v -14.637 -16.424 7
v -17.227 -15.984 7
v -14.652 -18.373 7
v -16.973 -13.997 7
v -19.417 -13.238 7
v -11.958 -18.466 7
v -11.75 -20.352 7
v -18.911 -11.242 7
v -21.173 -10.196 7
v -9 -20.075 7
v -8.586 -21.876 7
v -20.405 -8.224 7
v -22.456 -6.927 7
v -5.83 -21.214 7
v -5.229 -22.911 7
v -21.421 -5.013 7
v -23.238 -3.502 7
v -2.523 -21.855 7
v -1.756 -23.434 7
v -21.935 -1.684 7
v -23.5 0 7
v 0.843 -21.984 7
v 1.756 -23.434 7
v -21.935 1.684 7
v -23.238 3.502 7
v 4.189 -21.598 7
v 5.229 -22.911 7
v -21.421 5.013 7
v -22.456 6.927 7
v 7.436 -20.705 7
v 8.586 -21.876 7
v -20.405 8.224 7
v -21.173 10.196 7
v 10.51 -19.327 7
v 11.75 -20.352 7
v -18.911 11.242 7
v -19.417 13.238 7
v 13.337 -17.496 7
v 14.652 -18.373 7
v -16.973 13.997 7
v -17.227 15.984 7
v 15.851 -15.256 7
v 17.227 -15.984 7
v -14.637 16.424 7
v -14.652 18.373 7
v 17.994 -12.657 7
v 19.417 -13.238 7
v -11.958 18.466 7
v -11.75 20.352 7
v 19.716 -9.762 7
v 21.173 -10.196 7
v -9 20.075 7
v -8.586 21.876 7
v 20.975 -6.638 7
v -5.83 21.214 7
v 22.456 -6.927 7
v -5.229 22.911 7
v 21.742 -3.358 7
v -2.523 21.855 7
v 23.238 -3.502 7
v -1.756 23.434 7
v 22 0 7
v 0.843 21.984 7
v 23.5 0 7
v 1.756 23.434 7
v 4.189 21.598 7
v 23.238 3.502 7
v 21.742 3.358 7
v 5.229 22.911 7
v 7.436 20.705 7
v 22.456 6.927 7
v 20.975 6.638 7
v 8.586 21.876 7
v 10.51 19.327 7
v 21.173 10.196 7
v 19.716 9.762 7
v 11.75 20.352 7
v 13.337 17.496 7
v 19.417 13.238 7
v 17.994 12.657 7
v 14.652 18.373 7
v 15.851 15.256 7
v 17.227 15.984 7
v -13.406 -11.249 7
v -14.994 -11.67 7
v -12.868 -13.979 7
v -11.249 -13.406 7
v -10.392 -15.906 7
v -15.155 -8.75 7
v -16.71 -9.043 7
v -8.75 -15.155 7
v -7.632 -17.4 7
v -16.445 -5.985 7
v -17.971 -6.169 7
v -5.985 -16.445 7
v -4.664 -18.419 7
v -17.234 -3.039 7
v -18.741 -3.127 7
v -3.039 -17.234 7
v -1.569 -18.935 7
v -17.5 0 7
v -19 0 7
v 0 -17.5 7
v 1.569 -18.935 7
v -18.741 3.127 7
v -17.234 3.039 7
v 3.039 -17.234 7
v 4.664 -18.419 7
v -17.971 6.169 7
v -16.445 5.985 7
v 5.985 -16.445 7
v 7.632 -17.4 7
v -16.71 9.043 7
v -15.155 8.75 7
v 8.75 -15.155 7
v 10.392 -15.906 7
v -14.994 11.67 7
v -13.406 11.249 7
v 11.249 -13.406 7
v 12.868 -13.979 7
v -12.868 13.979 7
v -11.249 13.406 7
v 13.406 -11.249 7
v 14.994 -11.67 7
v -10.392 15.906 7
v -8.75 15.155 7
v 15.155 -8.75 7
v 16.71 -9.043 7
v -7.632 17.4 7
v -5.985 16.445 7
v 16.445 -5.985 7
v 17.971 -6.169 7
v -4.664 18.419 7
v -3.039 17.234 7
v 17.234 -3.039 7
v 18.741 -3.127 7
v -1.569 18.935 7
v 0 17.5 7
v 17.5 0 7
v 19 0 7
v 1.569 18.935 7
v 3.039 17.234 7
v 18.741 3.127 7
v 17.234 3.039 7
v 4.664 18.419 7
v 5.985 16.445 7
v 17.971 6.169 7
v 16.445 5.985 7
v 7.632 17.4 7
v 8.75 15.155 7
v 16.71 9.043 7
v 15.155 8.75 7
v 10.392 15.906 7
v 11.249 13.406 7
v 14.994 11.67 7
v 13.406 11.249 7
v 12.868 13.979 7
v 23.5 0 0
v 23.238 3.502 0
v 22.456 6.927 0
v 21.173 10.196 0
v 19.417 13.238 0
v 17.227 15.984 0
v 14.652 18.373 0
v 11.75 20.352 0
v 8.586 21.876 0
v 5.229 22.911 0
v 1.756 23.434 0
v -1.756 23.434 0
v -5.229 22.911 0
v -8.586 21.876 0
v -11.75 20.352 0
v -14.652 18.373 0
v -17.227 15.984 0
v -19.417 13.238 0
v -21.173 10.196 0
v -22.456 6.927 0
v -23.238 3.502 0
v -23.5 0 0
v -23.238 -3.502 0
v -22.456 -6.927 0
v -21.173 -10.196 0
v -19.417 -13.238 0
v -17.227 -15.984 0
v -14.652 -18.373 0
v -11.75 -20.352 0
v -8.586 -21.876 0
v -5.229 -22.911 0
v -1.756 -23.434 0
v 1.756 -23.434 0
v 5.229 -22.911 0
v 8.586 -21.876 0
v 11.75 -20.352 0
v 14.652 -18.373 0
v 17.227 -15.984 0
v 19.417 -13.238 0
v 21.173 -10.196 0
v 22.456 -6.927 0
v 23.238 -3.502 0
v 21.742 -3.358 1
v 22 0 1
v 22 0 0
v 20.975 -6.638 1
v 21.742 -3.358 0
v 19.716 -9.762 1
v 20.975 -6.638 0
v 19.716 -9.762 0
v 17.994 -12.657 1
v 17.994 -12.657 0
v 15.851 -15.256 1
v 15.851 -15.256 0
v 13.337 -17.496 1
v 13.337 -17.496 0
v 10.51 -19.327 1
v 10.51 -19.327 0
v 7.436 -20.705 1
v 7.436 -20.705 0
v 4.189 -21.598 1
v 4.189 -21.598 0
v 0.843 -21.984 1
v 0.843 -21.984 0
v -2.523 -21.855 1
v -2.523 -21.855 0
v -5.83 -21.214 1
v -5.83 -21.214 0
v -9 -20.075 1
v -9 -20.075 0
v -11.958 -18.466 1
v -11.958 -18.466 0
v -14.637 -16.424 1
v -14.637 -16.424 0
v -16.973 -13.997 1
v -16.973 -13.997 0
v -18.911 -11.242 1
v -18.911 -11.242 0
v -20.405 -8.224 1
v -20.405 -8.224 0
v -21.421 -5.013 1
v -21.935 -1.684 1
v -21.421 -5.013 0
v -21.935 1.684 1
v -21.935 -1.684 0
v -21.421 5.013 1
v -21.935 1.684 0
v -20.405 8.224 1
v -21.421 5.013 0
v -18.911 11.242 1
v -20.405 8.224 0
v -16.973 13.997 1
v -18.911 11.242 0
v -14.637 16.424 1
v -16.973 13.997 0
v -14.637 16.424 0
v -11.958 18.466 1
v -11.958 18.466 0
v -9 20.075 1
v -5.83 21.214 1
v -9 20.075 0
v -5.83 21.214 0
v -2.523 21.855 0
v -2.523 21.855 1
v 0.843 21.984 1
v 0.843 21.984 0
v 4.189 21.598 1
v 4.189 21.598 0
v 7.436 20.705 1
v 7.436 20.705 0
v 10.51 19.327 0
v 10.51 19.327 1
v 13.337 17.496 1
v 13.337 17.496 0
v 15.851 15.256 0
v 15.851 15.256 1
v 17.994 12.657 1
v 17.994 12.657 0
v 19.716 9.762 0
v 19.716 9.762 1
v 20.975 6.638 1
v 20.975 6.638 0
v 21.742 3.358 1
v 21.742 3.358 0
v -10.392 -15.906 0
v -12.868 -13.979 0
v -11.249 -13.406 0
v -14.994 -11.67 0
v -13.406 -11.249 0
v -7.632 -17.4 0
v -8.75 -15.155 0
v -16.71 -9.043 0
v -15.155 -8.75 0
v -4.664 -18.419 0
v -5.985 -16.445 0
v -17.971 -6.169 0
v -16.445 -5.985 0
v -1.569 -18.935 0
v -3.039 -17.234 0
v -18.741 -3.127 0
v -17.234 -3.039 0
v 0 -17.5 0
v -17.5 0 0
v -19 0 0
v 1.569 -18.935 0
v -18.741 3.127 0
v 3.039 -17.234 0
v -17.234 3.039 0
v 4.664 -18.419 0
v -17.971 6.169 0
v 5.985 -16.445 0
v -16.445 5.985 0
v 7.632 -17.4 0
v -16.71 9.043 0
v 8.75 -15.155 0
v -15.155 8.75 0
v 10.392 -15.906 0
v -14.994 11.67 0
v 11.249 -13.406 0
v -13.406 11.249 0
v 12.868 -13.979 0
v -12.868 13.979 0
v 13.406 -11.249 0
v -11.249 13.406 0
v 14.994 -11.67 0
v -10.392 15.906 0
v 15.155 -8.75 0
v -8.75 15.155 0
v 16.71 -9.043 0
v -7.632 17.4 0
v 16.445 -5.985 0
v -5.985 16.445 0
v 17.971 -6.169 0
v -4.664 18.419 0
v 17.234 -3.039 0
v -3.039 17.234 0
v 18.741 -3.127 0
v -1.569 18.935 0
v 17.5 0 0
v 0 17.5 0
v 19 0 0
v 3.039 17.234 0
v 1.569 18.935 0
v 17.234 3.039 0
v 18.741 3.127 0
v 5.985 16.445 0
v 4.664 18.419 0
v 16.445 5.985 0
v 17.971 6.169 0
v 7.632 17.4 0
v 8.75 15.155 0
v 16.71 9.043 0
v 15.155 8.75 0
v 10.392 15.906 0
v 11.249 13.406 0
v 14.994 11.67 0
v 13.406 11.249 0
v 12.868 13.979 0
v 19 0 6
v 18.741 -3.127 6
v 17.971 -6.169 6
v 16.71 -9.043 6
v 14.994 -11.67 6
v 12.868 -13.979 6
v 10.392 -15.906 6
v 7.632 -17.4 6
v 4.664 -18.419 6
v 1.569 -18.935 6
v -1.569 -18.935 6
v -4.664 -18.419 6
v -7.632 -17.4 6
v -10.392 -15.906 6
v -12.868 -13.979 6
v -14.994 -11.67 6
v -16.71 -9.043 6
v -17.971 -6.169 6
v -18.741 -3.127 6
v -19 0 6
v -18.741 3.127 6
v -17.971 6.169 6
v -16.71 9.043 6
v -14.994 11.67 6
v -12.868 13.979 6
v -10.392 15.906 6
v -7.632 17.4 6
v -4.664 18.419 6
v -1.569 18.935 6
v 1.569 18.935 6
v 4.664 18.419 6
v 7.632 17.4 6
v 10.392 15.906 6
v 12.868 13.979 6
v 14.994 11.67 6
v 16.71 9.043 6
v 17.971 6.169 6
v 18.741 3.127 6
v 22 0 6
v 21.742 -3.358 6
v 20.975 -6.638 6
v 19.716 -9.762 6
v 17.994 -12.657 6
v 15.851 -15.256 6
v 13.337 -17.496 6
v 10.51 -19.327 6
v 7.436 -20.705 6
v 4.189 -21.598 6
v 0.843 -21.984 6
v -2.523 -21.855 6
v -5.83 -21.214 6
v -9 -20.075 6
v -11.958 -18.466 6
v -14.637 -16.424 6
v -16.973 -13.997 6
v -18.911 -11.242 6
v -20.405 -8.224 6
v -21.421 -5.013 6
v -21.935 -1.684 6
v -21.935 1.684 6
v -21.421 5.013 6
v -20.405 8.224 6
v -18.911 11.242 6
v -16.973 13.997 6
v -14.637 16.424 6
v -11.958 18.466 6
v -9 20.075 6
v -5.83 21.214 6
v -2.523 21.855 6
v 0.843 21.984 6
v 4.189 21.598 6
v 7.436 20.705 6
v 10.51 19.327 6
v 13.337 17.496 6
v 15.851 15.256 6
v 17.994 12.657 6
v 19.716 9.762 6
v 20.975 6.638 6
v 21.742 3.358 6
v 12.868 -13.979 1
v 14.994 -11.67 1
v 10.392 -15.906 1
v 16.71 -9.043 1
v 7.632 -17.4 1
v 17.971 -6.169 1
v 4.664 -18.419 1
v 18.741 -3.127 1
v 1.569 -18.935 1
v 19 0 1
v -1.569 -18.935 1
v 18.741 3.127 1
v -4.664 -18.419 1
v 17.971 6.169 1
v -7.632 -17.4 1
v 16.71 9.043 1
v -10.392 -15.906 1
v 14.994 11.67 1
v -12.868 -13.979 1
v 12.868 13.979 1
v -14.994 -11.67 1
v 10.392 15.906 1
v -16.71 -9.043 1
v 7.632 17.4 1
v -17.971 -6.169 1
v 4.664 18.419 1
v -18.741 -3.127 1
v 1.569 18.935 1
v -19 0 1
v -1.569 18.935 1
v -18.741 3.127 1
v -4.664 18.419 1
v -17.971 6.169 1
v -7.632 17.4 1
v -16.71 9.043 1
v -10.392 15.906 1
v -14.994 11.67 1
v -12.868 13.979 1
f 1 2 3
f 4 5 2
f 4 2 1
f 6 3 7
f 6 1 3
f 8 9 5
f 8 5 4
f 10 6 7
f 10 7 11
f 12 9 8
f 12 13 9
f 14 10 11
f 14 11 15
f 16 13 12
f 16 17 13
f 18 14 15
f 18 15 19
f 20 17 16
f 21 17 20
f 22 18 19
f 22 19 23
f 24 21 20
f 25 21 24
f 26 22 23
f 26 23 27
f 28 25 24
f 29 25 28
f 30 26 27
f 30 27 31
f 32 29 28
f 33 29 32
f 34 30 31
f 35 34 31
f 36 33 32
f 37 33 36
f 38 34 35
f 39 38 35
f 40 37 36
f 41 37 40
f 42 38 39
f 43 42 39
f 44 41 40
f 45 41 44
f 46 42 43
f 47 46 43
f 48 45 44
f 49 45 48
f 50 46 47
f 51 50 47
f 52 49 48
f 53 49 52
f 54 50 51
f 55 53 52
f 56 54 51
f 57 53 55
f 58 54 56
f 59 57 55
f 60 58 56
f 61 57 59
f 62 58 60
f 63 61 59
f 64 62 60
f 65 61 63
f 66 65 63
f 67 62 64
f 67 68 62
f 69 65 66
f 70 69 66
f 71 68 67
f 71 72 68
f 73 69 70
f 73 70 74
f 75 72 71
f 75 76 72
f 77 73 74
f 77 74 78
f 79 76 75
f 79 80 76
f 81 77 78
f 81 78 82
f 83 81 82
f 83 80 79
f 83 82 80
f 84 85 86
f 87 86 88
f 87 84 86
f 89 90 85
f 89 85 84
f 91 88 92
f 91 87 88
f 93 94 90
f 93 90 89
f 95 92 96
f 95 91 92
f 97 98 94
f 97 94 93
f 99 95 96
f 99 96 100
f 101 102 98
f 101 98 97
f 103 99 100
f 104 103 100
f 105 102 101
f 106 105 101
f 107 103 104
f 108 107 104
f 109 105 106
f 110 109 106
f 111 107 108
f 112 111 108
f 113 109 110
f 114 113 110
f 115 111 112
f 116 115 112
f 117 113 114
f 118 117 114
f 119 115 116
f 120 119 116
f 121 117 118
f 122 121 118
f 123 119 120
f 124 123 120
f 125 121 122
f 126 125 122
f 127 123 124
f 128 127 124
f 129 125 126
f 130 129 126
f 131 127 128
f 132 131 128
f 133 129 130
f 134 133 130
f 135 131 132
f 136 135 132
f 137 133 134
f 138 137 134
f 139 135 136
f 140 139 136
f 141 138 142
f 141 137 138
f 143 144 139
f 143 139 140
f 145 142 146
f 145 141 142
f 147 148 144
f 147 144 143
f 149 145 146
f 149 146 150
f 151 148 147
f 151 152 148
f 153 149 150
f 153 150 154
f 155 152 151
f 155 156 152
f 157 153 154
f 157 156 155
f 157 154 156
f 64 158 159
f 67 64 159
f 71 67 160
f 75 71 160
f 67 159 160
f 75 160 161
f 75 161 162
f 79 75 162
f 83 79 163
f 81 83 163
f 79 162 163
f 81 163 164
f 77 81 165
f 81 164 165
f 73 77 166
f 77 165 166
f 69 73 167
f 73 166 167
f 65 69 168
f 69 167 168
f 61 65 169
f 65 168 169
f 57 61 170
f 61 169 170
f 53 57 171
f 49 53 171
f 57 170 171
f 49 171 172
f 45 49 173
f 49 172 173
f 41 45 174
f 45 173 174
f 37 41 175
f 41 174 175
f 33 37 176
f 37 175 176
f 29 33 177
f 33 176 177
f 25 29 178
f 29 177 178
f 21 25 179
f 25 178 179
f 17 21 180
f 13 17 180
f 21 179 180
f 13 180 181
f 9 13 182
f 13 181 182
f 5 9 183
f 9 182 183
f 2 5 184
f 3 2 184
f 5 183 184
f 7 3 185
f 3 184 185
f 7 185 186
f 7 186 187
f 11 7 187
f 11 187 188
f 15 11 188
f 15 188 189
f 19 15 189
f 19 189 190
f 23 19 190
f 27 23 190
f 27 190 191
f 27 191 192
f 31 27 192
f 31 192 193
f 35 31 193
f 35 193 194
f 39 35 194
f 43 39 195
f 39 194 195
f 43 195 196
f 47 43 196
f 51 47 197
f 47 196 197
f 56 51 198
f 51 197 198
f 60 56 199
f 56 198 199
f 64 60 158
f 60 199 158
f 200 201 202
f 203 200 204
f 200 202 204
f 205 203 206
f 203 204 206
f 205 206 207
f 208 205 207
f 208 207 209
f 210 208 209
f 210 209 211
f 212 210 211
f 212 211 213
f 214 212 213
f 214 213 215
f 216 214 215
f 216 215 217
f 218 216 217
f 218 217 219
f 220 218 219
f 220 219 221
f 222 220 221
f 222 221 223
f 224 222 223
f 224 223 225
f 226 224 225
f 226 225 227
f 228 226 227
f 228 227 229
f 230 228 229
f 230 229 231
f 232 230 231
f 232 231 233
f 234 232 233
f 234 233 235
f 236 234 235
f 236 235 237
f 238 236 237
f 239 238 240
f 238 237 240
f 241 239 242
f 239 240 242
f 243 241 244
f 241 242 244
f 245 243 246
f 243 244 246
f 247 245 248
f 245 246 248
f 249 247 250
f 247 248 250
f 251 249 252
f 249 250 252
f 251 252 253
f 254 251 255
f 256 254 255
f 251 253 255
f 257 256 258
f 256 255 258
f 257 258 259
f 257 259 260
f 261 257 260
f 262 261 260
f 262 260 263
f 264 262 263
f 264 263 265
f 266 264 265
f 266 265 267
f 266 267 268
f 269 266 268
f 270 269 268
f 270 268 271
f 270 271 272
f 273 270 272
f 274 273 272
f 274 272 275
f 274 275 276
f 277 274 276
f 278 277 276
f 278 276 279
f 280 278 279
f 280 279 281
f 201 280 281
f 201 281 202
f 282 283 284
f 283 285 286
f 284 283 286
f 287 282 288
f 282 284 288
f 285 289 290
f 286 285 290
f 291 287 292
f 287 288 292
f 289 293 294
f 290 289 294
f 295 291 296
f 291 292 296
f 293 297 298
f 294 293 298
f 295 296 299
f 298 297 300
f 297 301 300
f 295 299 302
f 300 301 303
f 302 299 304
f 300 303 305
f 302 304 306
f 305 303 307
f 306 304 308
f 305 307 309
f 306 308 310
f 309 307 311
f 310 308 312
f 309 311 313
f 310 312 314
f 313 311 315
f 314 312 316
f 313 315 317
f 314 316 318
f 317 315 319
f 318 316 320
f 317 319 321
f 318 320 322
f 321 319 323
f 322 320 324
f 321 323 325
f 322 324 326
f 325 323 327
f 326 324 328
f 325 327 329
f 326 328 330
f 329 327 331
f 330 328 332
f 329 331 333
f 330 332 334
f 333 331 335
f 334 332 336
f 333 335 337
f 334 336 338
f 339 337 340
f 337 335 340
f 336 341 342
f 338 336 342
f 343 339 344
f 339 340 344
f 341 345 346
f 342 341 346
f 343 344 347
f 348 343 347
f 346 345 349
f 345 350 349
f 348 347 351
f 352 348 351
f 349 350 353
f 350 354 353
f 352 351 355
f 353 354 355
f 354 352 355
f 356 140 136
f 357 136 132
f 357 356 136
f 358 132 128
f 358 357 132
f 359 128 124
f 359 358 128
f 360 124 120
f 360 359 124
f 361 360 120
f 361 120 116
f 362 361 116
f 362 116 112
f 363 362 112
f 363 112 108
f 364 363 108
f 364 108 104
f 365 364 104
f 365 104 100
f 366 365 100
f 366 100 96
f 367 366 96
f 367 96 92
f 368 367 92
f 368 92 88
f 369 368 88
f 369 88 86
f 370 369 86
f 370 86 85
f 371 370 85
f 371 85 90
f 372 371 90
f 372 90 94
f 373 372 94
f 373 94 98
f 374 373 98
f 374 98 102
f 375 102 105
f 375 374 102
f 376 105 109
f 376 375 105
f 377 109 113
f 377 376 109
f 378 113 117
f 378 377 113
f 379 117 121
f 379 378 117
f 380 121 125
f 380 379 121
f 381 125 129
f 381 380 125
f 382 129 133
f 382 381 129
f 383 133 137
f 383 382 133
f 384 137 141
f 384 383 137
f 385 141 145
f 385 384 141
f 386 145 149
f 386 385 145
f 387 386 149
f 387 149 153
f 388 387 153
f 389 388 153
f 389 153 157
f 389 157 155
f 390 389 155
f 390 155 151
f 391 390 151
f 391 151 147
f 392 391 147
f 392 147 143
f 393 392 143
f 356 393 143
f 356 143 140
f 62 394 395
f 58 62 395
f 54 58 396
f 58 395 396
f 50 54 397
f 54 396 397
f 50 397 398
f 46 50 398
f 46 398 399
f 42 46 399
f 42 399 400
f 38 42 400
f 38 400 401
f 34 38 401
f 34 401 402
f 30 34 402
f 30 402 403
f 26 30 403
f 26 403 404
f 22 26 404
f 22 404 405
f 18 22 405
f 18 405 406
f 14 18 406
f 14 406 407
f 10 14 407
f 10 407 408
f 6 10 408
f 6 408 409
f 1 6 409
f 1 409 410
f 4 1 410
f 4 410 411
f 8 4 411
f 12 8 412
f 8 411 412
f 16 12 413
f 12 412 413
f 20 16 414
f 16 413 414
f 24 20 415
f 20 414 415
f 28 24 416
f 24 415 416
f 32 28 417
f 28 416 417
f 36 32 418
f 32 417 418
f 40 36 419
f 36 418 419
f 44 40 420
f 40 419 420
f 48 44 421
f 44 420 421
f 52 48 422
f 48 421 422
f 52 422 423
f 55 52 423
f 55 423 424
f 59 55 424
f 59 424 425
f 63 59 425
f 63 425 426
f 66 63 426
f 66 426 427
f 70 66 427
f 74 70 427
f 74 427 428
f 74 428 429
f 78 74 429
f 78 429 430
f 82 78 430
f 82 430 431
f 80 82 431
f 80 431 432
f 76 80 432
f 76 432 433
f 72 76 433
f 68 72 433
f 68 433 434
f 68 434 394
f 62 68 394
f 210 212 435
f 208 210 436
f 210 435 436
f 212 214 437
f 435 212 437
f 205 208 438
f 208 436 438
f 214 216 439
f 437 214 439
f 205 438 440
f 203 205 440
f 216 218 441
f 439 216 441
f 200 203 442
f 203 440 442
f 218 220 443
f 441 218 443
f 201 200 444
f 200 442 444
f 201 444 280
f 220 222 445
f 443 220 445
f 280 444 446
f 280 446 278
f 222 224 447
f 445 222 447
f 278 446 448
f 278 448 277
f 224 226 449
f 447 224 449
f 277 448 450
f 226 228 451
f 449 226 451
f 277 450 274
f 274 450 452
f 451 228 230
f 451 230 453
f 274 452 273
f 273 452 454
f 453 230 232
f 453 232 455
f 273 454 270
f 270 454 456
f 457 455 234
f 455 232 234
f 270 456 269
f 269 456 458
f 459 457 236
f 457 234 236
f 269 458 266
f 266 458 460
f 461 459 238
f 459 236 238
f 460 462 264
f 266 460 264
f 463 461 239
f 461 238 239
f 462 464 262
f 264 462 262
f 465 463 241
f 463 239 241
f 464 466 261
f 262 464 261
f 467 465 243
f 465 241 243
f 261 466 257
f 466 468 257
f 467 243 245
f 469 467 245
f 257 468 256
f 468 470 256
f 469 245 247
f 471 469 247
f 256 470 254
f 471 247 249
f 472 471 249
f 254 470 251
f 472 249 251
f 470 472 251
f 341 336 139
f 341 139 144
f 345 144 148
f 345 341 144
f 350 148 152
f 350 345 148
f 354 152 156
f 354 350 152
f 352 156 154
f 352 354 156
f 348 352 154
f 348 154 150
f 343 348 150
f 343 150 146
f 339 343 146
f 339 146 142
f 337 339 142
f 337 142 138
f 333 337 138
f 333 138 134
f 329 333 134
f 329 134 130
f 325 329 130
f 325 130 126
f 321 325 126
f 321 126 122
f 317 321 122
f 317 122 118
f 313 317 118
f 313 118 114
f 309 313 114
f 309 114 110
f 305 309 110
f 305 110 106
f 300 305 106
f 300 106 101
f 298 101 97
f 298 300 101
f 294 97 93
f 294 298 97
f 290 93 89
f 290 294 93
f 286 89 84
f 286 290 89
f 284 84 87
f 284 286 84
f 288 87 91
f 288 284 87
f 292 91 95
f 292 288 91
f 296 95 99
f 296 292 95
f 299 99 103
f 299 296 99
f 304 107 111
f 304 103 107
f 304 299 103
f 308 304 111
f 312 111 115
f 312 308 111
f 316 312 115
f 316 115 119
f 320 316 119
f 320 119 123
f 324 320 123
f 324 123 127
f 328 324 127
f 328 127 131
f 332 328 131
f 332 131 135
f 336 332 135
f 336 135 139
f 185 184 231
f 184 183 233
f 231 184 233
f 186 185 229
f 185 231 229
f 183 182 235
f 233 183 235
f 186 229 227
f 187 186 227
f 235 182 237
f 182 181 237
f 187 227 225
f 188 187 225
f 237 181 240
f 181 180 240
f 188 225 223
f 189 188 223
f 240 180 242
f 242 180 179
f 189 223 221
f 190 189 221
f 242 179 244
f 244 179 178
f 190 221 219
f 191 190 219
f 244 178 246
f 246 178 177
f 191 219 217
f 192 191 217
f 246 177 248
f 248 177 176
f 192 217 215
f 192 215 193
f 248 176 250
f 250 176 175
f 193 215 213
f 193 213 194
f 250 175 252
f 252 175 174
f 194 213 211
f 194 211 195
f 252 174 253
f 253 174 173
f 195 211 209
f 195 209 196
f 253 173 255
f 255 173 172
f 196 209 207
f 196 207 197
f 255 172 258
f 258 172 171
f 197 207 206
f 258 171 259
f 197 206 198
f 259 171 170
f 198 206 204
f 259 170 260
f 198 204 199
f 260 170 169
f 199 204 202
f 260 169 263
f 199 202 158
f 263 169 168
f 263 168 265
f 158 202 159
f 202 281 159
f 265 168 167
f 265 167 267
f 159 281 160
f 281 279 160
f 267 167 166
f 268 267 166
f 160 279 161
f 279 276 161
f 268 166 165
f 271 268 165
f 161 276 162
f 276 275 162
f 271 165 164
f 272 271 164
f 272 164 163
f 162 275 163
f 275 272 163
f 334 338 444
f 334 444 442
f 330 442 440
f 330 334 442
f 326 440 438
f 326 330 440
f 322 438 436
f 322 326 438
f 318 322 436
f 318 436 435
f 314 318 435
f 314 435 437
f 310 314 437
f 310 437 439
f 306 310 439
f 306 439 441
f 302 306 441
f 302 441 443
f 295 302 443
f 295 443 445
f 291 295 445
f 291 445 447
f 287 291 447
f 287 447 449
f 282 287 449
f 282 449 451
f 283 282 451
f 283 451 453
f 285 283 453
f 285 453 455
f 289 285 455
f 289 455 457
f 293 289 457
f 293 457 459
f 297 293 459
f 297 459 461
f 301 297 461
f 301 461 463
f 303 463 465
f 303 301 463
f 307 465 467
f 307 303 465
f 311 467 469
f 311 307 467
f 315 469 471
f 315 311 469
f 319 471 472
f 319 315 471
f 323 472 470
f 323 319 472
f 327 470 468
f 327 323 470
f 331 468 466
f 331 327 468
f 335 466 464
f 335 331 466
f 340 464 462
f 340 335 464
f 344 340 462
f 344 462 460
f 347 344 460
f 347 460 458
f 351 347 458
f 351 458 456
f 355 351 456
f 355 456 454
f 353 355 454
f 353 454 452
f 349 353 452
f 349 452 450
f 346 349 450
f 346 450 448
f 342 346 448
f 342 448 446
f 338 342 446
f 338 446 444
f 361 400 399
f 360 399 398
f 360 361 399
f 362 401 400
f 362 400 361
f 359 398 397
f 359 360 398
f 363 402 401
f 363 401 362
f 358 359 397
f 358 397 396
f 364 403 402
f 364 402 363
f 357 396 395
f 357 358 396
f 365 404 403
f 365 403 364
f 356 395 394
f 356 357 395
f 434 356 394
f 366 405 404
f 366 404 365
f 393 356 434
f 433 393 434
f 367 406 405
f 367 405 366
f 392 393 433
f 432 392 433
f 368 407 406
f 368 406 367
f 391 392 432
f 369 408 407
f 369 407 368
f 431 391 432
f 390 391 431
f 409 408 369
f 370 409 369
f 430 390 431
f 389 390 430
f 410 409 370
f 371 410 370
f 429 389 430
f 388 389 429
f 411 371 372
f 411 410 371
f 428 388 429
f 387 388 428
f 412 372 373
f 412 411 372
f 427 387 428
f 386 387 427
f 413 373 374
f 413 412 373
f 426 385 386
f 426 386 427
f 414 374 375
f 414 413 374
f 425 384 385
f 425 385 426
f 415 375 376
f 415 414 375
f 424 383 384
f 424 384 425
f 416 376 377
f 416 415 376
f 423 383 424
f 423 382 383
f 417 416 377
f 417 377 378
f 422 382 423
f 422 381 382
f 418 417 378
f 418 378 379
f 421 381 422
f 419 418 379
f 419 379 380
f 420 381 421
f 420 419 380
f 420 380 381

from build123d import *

# Parameters (mm, degrees)
SKETCH1_R               = 23.5
BOSS_EXTRUDE1_DEPTH     = 7
SKETCH2_R               = 17.5
CUT_EXTRUDE1_DEPTH      = 34.963215395
SKETCH3_R               = 22
SKETCH3_R_2             = 19
CUT_EXTRUDE_THIN1_DEPTH = 34.963215395
EXTRUDE_THIN1_START     = 1
SKETCH4_R               = 22
SKETCH4_R_2             = 19
EXTRUDE_THIN1_DEPTH     = 5


with BuildPart() as part:
    # Sketch1 → Boss-Extrude1 (new body)
    with BuildSketch(Plane(origin=(0, 0, 0), x_dir=(0, 1, 0), z_dir=(0, 0, 1))):
        with Locations(Location((0, 0, 0), (0, 0, 270))):
            Circle(SKETCH1_R)
    extrude(amount=BOSS_EXTRUDE1_DEPTH)

    # Sketch2 → Cut-Extrude1 (cut, through all)
    with BuildSketch(Plane(origin=(0, 0, 0), x_dir=(0, 1, 0), z_dir=(0, 0, 1))):
        with Locations(Location((0, 0, 0), (0, 0, 270))):
            Circle(SKETCH2_R)
    extrude(amount=CUT_EXTRUDE1_DEPTH, mode=Mode.SUBTRACT)

    # Sketch3 → Cut-Extrude-Thin1 (cut, through all)
    with BuildSketch(Plane(origin=(0, 0, 0), x_dir=(1, 0, 0), z_dir=(0, 0, -1))):
        Circle(SKETCH3_R)
        Circle(SKETCH3_R_2, mode=Mode.SUBTRACT)
    extrude(amount=-CUT_EXTRUDE_THIN1_DEPTH, mode=Mode.SUBTRACT)


with BuildPart() as cut_extrude_thin1_piece_1:
    # of the separate pieces the step leaves, piece 1, a body of its own (cut_extrude_thin1_pieces)
    add(part.part.solids().sort_by_distance((23.5, 0, 0))[0])



with BuildPart() as cut_extrude_thin1_piece_2:
    # of the separate pieces the step leaves, piece 2, a body of its own (cut_extrude_thin1_pieces)
    add(part.part.solids().sort_by_distance((19, 0, 0))[0])


with BuildPart() as cut_extrude_thin1_piece_1_1:
    add(cut_extrude_thin1_piece_1.part)

    add(cut_extrude_thin1_piece_2.part)  # Extrude-Thin1 merges Cut-Extrude-Thin1 piece 2
    # Sketch4 → Extrude-Thin1 (add)
    with BuildSketch(Plane(origin=(0, 0, 0), x_dir=(0, 1, 0), z_dir=(0, 0, 1)).offset(EXTRUDE_THIN1_START)):
        Circle(SKETCH4_R)
        Circle(SKETCH4_R_2, mode=Mode.SUBTRACT)
    extrude(amount=EXTRUDE_THIN1_DEPTH)


solid = cut_extrude_thin1_piece_1_1.part
